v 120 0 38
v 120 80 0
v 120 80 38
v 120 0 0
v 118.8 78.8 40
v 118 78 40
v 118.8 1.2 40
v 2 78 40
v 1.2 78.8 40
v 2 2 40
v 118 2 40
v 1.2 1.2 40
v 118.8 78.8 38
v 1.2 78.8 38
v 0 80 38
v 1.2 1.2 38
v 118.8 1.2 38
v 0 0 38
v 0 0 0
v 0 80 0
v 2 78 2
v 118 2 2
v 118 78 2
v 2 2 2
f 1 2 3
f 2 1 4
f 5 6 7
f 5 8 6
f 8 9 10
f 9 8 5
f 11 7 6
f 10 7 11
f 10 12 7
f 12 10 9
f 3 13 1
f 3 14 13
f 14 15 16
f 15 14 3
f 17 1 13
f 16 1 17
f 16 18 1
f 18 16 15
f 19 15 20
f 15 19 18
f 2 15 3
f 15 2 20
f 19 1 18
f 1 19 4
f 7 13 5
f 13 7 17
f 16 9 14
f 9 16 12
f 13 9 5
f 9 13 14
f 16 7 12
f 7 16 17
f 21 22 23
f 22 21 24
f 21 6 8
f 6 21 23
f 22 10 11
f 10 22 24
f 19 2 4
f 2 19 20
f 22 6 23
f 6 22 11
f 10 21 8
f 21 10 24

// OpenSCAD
// ============================================================================
// Modular Storage Container
// Purpose: Box with optional dividers and stack lips.
// Units: millimetres (mm)
// ============================================================================

/* ----------------------------- USER PARAMETERS -------------------------------- */
box_length = 120;         // box length (mm)
box_width = 80;           // box width (mm)
box_height = 40;          // box height (mm)
wall_thickness = 2;       // wall thickness (mm)
dividers_enabled = true;  // include dividers
divider_count = 2;        // number of dividers
stackable = true;         // include stacking lips
clearance = 0.25;         // fit tolerance

/* ------------------------- Assertions & Limits ---------------------------- */
assert(box_length > 0 && box_width > 0 && box_height > 0, "box dims > 0");
assert(wall_thickness >= 0, "wall_thickness ≥ 0");
assert(divider_count >= 0, "divider_count ≥ 0");

/* ------------------------- Derived Measurements --------------------------- */
inner_length = box_length - 2*wall_thickness;
inner_width  = box_width  - 2*wall_thickness;
inner_height = box_height - wall_thickness;

/* ------------------------------ Modules ---------------------------------- */
module storage_box_modular() {
  difference() {
    // Outer shell
    cube([box_length, box_width, box_height], center=false);

    // Hollow
    if (wall_thickness > 0) {
      translate([wall_thickness, wall_thickness, wall_thickness])
        cube([inner_length, inner_width, inner_height], center=false);
    }

    // Stack lip (simple ledge)
    if (stackable) {
      translate([0,0,box_height - 2])
        difference() {
          cube([box_length, box_width, 2], center=false);
          translate([1.2,1.2,-0.5]) cube([box_length - 2.4, box_width - 2.4, 3], center=false);
        }
    }

    // Dividers (vertical in length direction)
    if (dividers_enabled && divider_count > 0 && inner_length > 10) {
      pitch = inner_length / (divider_count + 1);
      for (i = [1:divider_count]) {
        translate([wall_thickness + i*pitch - 0.5, wall_thickness, wall_thickness])
          cube([1.0, inner_width, inner_height], center=false);
      }
    }
  }
}

/* --------------------------------- Call ---------------------------------- */
storage_box_modular();

/* ============================== HOW TO PRINT / ORIENT ============================== */
// Print orientation: Bottom down on build plate
// Supports: None needed
// Layer height: 0.2-0.3mm
// Infill: 15-20% for light storage use
// Print speed: Normal (50mm/s)
// Post-processing: Test stacking fit if using stackable feature
